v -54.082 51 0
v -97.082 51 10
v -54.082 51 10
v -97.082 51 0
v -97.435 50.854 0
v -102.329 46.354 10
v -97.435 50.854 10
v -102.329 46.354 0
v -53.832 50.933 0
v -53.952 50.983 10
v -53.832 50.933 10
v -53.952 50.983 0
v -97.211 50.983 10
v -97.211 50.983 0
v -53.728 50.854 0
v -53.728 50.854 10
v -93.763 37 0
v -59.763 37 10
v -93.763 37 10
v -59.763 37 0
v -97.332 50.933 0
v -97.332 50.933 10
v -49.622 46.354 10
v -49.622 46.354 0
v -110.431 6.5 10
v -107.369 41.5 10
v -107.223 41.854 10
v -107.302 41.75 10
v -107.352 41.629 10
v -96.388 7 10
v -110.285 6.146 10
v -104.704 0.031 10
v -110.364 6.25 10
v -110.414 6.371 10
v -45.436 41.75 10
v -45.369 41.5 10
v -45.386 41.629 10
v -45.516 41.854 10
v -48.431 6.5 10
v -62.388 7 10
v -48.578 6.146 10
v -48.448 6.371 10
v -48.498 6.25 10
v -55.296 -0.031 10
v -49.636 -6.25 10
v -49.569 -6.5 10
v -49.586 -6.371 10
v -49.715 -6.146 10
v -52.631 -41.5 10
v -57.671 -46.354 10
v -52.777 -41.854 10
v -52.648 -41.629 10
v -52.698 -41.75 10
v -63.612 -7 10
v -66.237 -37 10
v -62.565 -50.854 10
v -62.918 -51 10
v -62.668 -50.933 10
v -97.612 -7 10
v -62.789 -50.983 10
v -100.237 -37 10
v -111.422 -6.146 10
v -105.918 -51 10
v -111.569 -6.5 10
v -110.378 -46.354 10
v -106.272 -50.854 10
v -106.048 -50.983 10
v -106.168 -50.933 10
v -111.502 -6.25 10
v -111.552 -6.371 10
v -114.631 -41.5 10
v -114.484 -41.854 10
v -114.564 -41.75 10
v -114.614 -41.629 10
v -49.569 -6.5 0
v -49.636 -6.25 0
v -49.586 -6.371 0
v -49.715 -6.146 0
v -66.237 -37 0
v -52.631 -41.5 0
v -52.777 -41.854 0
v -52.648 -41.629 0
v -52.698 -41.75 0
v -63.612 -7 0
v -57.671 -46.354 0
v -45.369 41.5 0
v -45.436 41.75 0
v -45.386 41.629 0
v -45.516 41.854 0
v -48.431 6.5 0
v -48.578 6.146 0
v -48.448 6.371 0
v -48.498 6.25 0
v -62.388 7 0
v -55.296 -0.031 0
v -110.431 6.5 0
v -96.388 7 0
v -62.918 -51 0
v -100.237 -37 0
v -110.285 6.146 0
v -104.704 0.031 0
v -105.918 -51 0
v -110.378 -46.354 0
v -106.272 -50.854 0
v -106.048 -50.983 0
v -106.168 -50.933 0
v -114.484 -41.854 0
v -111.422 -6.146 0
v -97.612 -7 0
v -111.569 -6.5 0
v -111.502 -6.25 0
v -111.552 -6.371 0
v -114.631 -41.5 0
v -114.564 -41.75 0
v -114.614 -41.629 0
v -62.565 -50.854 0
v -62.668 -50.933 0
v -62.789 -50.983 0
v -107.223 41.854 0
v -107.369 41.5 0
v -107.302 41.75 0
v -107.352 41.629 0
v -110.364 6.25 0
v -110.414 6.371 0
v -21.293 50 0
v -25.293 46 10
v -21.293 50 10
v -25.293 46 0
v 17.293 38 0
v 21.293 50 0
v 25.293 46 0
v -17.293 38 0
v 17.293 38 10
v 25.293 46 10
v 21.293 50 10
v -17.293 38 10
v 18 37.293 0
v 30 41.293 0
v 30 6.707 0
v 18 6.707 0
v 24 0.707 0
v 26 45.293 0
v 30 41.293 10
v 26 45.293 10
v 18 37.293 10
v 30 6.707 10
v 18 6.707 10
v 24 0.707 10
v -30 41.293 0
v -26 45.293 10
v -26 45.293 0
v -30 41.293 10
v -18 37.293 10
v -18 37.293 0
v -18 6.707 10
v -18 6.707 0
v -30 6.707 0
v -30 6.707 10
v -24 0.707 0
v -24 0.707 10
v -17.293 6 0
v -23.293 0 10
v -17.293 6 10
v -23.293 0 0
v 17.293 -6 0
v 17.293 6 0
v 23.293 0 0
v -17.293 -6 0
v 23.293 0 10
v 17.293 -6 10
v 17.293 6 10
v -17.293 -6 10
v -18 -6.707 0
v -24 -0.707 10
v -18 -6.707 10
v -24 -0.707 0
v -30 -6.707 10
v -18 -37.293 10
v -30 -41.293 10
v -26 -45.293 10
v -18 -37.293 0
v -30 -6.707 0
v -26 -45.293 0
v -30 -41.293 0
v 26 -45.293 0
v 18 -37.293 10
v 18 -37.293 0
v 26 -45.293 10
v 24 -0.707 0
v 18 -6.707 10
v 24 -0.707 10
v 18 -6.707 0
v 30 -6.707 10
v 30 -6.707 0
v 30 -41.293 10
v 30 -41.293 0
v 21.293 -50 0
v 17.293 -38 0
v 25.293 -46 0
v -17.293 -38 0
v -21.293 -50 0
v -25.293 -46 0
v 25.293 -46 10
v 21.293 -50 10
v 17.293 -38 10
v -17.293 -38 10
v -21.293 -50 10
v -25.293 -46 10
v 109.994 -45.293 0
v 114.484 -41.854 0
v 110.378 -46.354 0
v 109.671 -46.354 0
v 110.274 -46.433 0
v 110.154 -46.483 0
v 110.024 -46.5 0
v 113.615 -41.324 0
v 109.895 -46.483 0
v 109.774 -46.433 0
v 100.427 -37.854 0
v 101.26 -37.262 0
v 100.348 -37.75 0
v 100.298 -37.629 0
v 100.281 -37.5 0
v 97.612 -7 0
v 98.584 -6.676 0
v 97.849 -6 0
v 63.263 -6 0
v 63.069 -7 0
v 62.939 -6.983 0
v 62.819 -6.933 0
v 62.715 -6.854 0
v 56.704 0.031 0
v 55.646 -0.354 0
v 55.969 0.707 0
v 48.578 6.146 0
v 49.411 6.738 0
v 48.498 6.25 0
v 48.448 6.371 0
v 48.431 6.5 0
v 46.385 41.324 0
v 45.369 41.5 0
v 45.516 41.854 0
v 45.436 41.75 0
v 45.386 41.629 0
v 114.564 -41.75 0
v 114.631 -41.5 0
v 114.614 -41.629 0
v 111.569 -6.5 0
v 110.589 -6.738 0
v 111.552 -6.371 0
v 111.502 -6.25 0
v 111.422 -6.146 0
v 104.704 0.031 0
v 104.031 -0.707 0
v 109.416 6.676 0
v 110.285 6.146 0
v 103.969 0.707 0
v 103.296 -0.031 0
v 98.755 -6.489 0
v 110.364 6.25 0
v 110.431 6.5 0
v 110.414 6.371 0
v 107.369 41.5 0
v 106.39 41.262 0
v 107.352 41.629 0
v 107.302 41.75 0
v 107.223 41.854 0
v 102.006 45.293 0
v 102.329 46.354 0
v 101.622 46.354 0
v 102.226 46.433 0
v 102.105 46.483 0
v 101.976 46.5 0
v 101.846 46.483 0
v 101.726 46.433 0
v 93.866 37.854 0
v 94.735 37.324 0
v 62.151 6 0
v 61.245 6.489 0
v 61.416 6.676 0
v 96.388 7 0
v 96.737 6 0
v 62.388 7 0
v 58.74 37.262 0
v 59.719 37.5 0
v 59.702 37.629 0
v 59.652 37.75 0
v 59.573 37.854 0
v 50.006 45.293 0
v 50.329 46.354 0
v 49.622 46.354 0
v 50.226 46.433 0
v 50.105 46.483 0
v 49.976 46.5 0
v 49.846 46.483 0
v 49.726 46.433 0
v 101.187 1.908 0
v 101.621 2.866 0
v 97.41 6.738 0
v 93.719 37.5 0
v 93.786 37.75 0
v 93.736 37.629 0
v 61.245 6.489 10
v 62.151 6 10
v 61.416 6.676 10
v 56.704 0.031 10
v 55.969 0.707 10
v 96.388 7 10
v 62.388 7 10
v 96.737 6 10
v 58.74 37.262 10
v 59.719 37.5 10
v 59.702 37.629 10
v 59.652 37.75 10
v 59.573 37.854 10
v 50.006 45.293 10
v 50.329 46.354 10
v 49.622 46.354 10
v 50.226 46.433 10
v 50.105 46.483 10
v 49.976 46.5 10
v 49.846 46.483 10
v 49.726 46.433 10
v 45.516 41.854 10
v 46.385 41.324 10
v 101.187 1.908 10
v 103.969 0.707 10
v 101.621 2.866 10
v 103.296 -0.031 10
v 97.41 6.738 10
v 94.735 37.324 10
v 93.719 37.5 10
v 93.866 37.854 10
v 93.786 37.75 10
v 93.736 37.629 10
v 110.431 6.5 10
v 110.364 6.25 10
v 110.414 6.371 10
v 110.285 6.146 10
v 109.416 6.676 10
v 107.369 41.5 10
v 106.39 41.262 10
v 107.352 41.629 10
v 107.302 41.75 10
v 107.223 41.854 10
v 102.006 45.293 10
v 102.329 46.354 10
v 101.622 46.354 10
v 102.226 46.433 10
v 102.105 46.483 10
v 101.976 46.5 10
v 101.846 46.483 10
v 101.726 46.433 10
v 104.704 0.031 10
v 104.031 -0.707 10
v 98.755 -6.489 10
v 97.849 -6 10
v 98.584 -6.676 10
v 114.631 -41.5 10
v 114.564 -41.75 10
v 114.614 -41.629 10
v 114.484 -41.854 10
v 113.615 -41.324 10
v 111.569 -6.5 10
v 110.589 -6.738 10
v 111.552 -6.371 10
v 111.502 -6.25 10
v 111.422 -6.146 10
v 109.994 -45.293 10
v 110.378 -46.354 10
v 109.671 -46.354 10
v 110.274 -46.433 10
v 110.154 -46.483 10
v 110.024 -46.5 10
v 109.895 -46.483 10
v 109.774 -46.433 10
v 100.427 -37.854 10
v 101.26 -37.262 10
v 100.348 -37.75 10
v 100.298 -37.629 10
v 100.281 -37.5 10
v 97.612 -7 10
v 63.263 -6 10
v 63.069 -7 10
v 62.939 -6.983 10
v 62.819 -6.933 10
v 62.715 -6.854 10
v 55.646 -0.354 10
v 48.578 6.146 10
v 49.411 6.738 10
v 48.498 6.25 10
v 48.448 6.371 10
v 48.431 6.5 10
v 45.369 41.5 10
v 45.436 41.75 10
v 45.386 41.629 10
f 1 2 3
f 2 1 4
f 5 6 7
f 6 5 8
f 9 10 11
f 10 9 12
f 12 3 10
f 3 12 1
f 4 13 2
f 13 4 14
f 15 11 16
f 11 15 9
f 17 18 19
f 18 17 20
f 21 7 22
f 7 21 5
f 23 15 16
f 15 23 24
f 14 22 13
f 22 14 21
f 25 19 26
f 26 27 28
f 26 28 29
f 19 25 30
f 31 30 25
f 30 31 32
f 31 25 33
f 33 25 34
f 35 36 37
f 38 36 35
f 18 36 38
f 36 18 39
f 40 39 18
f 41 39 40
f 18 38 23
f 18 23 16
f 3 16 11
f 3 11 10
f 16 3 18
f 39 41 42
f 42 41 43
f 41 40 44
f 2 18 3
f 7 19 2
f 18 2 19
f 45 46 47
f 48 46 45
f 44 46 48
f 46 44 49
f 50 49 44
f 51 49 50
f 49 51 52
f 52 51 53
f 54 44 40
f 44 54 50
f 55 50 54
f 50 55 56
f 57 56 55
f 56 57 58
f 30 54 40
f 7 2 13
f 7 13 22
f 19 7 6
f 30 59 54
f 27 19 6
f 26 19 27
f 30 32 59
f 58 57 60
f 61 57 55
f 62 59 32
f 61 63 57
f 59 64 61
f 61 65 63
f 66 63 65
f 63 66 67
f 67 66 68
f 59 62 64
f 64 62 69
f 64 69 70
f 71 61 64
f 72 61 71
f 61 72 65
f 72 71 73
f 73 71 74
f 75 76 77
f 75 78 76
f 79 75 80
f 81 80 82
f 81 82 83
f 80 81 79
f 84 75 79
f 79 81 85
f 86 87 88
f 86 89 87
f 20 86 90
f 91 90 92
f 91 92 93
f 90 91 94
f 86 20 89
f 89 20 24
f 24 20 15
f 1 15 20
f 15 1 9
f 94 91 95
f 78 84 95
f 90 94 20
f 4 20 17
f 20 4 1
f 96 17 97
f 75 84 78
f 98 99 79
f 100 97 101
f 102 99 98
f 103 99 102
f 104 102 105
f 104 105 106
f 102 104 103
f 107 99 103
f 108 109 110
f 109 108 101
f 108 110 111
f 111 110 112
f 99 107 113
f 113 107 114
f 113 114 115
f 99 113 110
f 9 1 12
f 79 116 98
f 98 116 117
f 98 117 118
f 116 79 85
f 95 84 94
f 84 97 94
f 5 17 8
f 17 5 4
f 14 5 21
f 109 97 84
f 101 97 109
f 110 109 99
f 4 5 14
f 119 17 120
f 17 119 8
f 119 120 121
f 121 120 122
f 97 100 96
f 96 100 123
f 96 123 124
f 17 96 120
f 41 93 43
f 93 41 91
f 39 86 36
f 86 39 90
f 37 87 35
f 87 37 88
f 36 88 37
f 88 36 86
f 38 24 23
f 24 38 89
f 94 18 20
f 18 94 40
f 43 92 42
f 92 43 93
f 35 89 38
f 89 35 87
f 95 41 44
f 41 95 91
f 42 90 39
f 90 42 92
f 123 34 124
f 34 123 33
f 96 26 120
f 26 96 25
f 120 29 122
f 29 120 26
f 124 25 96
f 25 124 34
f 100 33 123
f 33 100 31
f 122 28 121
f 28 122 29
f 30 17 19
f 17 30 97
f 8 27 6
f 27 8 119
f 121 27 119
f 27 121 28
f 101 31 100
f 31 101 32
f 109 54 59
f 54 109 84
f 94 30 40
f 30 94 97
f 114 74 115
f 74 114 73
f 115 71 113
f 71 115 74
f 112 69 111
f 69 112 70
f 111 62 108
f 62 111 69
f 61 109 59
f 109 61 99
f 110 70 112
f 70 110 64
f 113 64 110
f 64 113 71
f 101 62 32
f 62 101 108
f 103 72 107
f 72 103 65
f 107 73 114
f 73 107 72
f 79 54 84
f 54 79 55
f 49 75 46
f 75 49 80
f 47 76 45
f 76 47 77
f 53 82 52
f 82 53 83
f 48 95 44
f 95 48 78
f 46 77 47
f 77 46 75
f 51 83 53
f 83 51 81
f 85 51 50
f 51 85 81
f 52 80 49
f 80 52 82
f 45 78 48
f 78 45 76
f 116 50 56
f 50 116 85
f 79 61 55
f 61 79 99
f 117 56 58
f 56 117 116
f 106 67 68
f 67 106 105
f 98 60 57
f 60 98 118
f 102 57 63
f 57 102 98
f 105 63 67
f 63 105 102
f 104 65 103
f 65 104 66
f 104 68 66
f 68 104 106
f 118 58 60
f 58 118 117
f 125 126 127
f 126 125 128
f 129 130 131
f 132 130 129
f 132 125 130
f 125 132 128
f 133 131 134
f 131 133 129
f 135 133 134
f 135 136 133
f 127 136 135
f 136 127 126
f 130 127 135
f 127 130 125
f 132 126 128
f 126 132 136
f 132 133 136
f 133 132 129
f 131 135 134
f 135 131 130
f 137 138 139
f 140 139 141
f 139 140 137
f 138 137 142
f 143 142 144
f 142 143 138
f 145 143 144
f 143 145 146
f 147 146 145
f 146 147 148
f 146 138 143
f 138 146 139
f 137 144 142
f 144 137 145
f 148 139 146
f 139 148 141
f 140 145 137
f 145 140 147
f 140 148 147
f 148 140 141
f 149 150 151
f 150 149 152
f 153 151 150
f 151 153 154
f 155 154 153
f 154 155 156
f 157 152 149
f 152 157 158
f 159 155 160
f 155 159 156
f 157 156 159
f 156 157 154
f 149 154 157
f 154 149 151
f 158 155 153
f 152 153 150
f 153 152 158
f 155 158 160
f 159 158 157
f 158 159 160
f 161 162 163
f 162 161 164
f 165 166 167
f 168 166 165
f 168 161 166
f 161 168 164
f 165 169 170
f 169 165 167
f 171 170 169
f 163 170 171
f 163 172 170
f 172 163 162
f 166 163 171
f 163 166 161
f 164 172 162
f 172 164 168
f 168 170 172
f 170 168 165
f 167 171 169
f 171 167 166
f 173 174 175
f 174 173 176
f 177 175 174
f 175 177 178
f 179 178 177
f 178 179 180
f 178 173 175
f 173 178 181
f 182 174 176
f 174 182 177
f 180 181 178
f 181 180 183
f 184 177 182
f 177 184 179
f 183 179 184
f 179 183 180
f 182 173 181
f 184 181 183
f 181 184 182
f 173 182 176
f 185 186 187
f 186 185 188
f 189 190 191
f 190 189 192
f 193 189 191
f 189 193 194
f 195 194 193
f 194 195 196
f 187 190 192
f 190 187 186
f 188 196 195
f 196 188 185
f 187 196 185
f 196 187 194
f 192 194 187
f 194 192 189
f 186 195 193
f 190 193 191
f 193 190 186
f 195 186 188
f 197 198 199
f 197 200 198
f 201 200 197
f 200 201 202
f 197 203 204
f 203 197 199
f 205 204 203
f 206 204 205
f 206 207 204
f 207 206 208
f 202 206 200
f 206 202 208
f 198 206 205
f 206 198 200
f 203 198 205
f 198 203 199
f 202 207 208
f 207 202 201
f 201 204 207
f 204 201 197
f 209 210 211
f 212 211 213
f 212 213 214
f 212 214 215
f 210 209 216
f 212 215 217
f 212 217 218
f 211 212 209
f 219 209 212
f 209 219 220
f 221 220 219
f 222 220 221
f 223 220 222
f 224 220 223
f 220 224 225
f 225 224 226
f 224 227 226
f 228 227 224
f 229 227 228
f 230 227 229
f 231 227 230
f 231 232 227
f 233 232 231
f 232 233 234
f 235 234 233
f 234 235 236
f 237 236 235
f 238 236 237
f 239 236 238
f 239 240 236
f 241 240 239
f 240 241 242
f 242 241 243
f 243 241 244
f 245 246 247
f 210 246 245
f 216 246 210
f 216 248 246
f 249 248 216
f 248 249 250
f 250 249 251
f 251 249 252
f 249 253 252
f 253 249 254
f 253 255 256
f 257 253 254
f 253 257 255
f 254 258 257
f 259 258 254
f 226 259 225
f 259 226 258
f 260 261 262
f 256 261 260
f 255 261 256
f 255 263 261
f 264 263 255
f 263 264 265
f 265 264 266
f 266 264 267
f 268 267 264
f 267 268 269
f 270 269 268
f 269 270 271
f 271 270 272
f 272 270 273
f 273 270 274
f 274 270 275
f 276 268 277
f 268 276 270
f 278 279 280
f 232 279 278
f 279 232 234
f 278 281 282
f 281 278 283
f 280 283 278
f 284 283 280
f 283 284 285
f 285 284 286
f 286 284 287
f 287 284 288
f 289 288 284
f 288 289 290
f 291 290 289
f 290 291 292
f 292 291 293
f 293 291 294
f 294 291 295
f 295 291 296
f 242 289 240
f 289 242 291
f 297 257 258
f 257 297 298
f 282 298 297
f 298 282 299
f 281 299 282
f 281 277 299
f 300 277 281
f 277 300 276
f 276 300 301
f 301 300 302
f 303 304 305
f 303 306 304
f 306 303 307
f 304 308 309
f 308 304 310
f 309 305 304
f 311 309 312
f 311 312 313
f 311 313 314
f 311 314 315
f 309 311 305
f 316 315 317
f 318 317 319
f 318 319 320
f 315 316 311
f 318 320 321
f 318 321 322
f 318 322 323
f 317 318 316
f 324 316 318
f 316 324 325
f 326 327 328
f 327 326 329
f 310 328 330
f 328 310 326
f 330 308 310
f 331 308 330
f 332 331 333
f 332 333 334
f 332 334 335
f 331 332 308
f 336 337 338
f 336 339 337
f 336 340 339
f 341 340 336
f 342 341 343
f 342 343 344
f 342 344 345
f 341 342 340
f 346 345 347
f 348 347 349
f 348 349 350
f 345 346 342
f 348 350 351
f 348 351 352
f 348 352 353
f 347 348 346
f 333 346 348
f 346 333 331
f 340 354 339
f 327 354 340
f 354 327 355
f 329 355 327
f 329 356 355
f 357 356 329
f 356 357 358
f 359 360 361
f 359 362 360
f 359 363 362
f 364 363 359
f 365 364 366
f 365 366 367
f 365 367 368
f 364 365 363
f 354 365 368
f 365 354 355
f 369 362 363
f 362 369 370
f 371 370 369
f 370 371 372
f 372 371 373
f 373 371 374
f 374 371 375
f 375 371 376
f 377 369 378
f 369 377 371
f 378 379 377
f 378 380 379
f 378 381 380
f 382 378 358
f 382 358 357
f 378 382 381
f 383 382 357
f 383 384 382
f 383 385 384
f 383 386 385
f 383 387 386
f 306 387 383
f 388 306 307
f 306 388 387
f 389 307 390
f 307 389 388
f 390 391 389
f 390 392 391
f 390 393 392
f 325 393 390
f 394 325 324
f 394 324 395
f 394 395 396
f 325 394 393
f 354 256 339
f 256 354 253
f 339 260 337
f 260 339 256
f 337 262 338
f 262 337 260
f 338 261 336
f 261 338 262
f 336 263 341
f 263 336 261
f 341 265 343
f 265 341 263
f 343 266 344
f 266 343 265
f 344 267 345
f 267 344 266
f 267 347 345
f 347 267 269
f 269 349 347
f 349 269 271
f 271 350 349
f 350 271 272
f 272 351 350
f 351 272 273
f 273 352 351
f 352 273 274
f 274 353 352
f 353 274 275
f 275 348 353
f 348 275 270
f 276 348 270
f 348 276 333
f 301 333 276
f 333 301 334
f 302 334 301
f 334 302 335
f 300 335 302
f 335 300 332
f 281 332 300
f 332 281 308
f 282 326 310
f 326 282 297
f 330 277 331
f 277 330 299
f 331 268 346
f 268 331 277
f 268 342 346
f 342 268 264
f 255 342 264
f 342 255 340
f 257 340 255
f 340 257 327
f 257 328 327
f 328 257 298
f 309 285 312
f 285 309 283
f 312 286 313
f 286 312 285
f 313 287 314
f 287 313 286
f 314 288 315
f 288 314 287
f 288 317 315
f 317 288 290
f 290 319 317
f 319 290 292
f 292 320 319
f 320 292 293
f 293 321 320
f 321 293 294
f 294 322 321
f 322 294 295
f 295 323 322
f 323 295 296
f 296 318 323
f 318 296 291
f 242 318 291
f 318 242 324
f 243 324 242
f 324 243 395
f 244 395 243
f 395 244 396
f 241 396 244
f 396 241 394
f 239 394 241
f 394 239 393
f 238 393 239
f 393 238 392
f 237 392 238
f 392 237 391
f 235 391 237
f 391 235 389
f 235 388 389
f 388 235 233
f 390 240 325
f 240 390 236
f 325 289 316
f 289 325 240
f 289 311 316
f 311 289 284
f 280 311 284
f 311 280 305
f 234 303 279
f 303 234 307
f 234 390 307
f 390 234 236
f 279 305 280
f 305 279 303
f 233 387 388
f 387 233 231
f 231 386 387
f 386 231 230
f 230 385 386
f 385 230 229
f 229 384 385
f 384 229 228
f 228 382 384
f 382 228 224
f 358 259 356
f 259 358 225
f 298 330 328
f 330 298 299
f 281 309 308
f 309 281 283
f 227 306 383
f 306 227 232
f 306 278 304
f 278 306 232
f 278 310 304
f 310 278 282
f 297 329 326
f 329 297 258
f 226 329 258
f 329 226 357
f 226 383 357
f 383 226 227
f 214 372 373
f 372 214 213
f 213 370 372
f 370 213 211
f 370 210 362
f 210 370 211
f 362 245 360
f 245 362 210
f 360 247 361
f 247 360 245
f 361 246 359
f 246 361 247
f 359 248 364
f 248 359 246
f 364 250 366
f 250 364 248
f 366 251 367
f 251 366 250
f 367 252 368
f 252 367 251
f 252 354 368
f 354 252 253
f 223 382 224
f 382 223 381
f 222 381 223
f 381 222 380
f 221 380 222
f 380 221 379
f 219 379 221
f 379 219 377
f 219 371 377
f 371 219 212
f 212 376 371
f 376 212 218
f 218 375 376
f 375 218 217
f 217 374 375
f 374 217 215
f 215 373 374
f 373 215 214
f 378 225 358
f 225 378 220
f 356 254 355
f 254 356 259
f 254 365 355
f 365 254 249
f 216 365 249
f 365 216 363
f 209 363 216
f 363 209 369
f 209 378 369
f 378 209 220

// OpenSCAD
/*
    OpenSCAD 7 Segment Library
    --------------------------
    
    To use this module, place "use <7seg.lib.scad>" in your code.
    Then call digit_outline() etc., see examples.
    
    Parameters are as follows:
    
    width:
        Width of the display at 0 degrees skew (only inner part, outline is excluded)
    height:
        Height of the display (only inner part, outline is excluded)
    thickness:
        Width of each segment itself (only inner part, outline is excluded)
    spacing:
        Spacing between the segments, this also defines the thickness of the outline
    depth:
        Depth (z direction) of the display. Set to 0 for 2D modules!
    skew:
        Skew (to right) of the display. This will increase the overall width!
    edge:
        Fraction between 0 and 1 for "cut" edges. 0 will give sharp edges
    segments:
        Array of segments to create. e.g. [1,2,3,5] will draw a "4"

*/

// Example preview:
translate([-80,0,0]) color("red")
    digit_hull(60,100,12,1,10,5,1);
    
translate([-00,0,0]) color("green")
    digit_inner(60,100,12,1,10,0,1);
    
translate([+80,0,0]) color("blue") 
    digit_outline(60,100,12,1,10,-5,1,[1,2,3,5]);



module digit_outline(width,height,thickness,spacing,depth=10,skew=0,edge=1,segments=[0:6],nice=1) {
    for(segment=segments) {
        segment_outline(width,height,thickness,spacing,depth,skew,edge,segment,nice);
    }
}

module digit_inner(width,height,thickness,spacing,depth=10,skew=0,edge=1,segments=[0:6],nice=1) {
    for(segment=segments) {
        segment_inner(width,height,thickness,spacing,depth,skew,edge,segment,nice);
    }
}


module digit_hull(width,height,thickness,spacing,depth=10,skew=0,edge=1,segments=[0:6],nice=1) {
    for(segment=segments) {
        segment_hull(width,height,thickness,spacing,depth,skew,edge,segment,nice);
    }
}



module segment_inner(width,height,thickness,spacing,depth,skew,edge,segment,nice) {
    __add_depth(depth) difference() {
        hull() segment_outline(width,height,thickness,spacing,0,skew,edge,segment,nice);
        segment_outline(width,height,thickness,spacing,0,skew,edge,segment,nice);
    }
}


module segment_hull(width,height,thickness,spacing,depth,skew,edge,segment,nice) {
    __add_depth(depth) hull() segment_outline(width,height,thickness,spacing,0,skew,edge,segment,nice);
}


module segment_outline(width,height,thickness,spacing,depth,skew,edge,segment,nice) {
    n = [
        [0,1],[1,3],[3,6],[6,5],[5,2],[2,0],
        [3,7],[7,11],[11,13],[13,10],[10,6],[6,3],
        [2,5],[5,9],[9,12],[12,8],[8,4],[4,2],
        [9,10],[10,13],[13,16],[16,15],[15,12],[12,9],
        [12,15],[15,19],[19,22],[22,18],[18,14],[14,12],
        [13,17],[17,21],[21,23],[23,20],[20,16],[16,13],
        [19,20],[20,23],[23,25],[25,24],[24,22],[22,19],
    ];
    __add_depth(depth) for(i=[0:5]) hull() {
        translate(segment_point(width,height,thickness,spacing,skew,edge,n[segment*6+i][0],nice)) circle(r=spacing/2,$fn=24);
        translate(segment_point(width,height,thickness,spacing,skew,edge,n[segment*6+i][1],nice)) circle(r=spacing/2,$fn=24);
    }
}

function segment_point(width,height,thickness,spacing,skew,edge,i,nice) =
    let(sx = width/2 + spacing/2,
    sy = height/2 + spacing/2,
    ss = thickness+spacing,
    st = ss*edge,
    
    bp = [
        [sx-ss/2, 0], // 13 - 0
        [sx-ss, ss/2], // 10 - 1
        [sx, ss/2], // 11 - 2
        [sx-ss, sy-ss], // 6 - 3
        [sx, sy-st], // 7 - 4
        [sx-st,sy], // 1 - 5
        [sx-st/2,sy-st/2] // 3 - 6
    ],

    p = [
        [-bp[5][0]-nice*thickness/3, bp[5][1]], // top top left
        [ bp[5][0]+nice*thickness/3, bp[5][1]], // top top right
        [-bp[6][0]-nice*thickness/6, bp[6][1]+nice*thickness/6], // top left outer contact
        [ bp[6][0]+nice*thickness/6, bp[6][1]+nice*thickness/6], // top right outer contact
        [-bp[4][0], bp[4][1]+nice*thickness/3], // top left left
        [-bp[3][0], bp[3][1]], // top left inner contact
        [ bp[3][0], bp[3][1]], // top right inner contact
        [ bp[4][0], bp[4][1]+nice*thickness/3], // top right right
        [-bp[2][0], bp[2][1]], // center left upper outer
        [-bp[1][0], bp[1][1]], // center left upper inner
        [ bp[1][0], bp[1][1]], // center right upper inner
        [ bp[2][0], bp[2][1]], // center right upper outer
        [-bp[0][0], bp[0][1]], // 12 -thickness/6 center left contact
        [ bp[0][0], bp[0][1]], // +thickness/6 center right contact
        [-bp[2][0],-bp[2][1]], // center left lower outer
        [-bp[1][0],-bp[1][1]], // center left lower inner
        [ bp[1][0],-bp[1][1]], // center right lower inner
        [ bp[2][0],-bp[2][1]], // center right lower outer
        [-bp[4][0],-bp[4][1]-nice*thickness/3], // bottom left left
        [-bp[3][0],-bp[3][1]], // bottom left inner contact
        [ bp[3][0],-bp[3][1]], // bottom right inner contact
        [ bp[4][0],-bp[4][1]-nice*thickness/3], // bottom right right
        [-bp[6][0]-nice*thickness/6,-bp[6][1]-nice*thickness/6], // bottom left outer contact
        [ bp[6][0]+nice*thickness/6,-bp[6][1]-nice*thickness/6], // bottom right outer contact
        [-bp[5][0]-nice*thickness/3,-bp[5][1]], // bottom bottom left
        [ bp[5][0]+nice*thickness/3,-bp[5][1]], // bottom bottom right
    ] * [
    [1,0],
    [tan(skew),1]
    ])
      p[i];

module __add_depth(depth) {
    if(depth > 0) {
        linear_extrude(depth) children();
    } else {
        children();
    }
}
